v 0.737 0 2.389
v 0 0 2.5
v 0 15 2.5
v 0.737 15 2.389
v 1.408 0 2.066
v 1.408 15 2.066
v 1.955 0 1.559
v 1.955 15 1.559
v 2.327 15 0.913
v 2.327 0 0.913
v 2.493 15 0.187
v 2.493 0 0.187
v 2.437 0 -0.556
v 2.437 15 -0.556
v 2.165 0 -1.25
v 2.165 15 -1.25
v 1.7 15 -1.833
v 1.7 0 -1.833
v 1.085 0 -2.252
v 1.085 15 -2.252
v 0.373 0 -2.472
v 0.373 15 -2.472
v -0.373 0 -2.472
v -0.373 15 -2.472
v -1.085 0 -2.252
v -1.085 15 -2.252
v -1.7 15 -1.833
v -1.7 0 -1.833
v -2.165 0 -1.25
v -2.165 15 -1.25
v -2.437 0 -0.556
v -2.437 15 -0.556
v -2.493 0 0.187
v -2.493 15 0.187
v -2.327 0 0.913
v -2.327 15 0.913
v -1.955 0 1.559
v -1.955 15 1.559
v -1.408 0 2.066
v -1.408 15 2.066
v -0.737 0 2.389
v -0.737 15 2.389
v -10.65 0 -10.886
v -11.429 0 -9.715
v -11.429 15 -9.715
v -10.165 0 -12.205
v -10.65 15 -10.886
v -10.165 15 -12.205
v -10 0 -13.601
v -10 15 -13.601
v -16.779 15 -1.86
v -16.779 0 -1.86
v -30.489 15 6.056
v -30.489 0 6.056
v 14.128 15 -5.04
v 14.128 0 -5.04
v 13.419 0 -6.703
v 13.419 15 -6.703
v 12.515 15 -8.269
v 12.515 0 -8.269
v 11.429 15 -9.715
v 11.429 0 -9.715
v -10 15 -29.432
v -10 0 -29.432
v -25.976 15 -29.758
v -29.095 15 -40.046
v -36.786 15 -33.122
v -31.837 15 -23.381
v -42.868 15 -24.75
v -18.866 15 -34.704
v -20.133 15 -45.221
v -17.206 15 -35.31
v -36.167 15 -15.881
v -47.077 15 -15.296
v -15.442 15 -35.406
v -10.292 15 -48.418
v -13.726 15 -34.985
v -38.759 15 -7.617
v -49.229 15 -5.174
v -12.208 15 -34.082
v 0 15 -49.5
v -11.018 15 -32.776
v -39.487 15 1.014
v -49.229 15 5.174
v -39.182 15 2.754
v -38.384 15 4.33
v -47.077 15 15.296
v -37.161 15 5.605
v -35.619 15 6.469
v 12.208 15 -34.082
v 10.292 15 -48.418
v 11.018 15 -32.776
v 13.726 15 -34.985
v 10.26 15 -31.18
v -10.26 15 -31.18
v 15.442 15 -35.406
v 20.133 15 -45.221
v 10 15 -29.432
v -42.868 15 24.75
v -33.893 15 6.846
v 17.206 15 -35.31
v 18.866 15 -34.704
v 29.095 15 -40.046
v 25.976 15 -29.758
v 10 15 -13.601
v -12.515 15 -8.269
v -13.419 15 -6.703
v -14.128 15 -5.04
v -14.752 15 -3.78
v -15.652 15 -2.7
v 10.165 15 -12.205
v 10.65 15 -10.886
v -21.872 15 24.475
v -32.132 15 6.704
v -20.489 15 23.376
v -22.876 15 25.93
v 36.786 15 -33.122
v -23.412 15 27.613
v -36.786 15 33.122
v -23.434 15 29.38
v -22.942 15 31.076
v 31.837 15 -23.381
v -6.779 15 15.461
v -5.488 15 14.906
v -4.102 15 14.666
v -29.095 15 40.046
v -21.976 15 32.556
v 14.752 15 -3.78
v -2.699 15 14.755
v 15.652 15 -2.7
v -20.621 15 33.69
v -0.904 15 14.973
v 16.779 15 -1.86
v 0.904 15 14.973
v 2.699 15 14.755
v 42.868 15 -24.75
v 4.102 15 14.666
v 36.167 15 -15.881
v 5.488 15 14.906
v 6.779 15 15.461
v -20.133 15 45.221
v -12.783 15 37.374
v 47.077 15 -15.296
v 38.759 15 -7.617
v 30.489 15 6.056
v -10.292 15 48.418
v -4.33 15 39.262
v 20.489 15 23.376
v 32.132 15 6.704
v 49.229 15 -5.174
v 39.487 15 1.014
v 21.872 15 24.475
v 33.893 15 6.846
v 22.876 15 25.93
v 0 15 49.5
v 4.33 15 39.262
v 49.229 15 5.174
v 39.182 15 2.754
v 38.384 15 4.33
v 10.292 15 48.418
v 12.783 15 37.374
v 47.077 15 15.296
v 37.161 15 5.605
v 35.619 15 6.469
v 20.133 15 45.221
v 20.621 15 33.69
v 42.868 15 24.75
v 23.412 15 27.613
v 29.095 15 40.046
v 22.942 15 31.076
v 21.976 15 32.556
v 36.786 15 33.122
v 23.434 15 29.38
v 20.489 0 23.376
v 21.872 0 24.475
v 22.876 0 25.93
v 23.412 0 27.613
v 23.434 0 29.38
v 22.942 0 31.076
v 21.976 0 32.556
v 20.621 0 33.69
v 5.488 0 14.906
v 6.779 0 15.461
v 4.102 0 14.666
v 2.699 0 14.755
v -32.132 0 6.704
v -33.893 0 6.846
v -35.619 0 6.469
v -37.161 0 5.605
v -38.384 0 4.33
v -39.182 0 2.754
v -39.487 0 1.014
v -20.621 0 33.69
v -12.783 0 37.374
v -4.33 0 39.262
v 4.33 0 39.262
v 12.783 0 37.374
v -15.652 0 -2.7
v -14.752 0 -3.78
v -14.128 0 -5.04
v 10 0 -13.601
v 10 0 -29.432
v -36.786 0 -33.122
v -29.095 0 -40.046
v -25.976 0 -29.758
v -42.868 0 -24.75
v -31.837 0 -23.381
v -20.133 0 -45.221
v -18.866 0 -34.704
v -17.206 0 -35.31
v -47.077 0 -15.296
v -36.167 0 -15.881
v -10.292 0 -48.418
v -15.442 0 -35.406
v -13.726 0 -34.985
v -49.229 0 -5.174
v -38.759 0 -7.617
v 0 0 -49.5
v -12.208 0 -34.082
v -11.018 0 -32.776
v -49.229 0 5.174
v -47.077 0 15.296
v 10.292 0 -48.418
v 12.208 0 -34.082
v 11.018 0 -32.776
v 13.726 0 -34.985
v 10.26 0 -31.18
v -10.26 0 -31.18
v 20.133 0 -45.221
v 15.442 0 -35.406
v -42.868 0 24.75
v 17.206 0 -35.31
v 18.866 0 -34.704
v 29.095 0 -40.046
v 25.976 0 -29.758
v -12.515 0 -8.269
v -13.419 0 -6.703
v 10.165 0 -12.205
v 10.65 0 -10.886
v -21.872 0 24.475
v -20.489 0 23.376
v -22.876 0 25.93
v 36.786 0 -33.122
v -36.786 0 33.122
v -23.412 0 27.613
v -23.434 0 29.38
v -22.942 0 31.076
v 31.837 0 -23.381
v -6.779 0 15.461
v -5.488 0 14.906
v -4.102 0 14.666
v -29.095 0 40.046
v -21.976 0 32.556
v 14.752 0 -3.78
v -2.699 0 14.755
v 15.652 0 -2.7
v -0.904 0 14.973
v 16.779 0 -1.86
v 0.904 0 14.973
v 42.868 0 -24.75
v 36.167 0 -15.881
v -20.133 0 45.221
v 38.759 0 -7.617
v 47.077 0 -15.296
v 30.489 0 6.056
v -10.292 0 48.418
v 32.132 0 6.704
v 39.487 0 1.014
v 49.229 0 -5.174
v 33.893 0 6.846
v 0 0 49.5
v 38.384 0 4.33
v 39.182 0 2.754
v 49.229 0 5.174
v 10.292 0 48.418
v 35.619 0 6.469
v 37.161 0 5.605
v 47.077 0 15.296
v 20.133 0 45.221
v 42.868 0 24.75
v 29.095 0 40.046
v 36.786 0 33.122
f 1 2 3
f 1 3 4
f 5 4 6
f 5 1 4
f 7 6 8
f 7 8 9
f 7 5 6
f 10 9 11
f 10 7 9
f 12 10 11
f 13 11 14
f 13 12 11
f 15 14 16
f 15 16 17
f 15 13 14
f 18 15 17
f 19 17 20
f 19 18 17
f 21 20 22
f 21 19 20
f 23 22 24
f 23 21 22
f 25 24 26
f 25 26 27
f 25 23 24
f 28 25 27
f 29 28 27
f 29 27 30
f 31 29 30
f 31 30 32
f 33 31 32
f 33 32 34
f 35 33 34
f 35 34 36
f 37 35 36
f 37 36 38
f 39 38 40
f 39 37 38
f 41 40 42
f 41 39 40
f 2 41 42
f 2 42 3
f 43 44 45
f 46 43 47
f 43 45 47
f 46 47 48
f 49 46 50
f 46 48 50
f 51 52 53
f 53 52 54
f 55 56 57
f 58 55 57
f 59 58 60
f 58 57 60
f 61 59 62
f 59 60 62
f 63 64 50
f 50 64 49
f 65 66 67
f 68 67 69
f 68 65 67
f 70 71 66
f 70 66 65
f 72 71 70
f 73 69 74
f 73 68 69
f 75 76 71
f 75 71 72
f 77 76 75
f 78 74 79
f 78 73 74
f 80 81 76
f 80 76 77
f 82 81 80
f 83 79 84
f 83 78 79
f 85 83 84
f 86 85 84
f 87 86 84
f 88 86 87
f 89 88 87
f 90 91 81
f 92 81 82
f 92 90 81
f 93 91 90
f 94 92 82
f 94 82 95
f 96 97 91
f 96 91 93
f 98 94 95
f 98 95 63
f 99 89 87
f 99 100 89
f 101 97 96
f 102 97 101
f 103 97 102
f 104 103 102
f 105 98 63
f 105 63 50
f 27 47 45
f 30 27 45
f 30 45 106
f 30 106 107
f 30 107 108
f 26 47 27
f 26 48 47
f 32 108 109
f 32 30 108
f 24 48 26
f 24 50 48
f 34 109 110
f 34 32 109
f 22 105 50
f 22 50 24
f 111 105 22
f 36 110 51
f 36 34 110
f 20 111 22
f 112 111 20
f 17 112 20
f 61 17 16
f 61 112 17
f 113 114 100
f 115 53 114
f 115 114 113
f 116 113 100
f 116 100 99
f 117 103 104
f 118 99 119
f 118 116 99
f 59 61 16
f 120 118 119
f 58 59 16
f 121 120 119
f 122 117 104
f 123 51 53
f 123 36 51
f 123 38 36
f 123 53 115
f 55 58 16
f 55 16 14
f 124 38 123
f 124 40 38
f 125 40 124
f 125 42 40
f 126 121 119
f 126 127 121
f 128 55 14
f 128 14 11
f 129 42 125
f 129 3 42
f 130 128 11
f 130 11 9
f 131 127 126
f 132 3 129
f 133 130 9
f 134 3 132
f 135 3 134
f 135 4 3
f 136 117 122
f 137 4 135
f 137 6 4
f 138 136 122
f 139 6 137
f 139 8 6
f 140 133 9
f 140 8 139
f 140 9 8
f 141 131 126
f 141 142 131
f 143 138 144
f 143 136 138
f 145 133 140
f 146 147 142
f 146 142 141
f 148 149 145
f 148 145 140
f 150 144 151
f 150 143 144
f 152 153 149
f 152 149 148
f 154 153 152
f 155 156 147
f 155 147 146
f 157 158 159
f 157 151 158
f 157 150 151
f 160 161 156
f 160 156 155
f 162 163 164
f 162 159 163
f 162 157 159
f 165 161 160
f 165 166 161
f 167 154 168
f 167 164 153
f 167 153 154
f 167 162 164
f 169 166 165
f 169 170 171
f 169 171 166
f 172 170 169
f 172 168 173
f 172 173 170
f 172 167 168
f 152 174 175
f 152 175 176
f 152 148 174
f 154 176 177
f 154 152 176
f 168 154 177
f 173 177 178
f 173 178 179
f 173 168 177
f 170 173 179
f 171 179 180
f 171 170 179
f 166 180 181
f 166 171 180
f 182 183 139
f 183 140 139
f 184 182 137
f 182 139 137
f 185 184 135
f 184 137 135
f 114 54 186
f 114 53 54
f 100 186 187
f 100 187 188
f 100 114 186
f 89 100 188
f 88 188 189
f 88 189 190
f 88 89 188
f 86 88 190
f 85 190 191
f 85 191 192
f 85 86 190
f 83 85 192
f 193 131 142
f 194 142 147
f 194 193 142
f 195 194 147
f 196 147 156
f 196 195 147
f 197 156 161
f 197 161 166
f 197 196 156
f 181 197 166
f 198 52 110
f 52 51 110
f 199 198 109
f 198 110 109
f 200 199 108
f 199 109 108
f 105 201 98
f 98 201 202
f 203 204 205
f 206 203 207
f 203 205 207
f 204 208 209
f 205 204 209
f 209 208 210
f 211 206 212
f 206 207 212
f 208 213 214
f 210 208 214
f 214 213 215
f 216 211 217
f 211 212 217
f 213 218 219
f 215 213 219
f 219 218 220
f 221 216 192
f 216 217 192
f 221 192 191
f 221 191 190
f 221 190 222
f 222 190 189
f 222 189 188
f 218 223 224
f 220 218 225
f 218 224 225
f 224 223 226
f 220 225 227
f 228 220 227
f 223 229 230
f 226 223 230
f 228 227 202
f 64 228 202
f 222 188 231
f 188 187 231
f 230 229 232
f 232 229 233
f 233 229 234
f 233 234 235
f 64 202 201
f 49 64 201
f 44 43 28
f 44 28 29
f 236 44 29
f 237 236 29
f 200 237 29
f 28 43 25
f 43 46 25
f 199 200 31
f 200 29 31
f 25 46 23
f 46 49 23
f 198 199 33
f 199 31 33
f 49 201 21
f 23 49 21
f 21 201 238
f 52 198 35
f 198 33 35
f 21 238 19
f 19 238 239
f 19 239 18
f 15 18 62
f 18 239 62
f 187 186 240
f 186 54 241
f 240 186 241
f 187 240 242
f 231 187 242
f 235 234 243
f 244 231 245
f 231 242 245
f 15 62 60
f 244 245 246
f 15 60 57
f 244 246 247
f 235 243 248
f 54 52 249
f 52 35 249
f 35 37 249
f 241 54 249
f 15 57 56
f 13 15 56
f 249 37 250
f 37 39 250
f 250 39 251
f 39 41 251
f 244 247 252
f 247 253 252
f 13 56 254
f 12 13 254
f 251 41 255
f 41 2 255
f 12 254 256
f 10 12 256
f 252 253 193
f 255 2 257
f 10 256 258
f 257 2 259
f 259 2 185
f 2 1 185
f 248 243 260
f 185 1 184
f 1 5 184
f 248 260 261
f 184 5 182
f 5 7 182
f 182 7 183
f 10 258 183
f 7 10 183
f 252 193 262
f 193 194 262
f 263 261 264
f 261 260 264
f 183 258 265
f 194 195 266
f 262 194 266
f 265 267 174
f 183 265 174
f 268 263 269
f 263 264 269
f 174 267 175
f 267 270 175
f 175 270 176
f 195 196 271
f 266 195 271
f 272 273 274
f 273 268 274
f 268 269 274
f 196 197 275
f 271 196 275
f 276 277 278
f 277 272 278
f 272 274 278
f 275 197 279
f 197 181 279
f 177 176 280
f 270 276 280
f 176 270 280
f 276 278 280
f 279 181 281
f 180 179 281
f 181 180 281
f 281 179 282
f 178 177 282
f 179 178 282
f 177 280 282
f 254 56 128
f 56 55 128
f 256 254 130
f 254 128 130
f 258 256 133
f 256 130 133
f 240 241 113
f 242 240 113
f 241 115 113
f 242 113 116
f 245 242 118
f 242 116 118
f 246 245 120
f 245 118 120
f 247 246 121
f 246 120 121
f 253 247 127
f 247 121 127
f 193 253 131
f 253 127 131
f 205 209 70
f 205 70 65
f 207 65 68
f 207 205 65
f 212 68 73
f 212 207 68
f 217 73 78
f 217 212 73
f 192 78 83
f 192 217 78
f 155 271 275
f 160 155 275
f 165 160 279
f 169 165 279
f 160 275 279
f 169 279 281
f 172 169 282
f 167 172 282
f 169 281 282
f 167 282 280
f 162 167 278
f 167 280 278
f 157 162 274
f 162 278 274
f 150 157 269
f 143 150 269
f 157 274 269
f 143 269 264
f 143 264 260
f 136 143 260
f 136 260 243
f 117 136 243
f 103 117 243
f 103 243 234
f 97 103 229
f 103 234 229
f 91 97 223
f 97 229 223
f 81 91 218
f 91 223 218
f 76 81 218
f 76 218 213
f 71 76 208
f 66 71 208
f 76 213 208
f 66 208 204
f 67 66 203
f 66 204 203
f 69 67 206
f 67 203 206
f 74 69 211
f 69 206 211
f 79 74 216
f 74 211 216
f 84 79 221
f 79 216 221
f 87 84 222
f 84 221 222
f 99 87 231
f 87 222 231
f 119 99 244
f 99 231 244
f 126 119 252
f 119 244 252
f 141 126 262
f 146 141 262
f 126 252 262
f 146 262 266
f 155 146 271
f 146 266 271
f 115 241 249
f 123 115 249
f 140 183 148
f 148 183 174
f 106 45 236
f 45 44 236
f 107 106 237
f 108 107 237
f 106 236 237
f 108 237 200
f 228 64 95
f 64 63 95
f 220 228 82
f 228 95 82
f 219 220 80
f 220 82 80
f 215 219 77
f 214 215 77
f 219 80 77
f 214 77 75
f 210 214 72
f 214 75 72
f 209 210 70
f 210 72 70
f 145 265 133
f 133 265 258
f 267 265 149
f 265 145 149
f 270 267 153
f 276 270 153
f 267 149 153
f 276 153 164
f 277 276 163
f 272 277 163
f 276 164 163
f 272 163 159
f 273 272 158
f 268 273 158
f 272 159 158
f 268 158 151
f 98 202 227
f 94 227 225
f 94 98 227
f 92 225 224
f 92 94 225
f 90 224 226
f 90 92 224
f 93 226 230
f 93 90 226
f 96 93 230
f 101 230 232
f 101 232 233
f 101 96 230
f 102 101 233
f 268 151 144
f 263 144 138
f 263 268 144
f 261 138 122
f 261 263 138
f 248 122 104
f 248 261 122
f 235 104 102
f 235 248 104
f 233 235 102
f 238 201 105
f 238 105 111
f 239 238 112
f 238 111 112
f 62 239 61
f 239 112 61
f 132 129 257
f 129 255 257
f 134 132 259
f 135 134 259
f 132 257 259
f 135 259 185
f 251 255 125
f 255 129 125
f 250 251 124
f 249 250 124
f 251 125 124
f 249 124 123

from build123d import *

# Parameters (mm, degrees)
SZKIC1_R                    = 49.5
SZKIC1_R_2                  = 39.5
SZKIC1_R_3                  = 15
SZKIC1_R_4                  = 2.5
DODANIE_WYCI_GNI_CIE1_DEPTH = 15
ZAOKR_GLENIE1_R             = 6


with BuildPart() as part:
    # Szkic1 → Dodanie-wyciągnięcie1 (new body)
    # profile 1 of 6: a face of its own
    with BuildSketch(Plane(origin=(0, 0, 0), x_dir=(1, 0, 0), z_dir=(0, 1, 0))):
        with Locations(Location((0, 0, 0), (0, 0, 270))):
            Circle(SZKIC1_R)
        Circle(SZKIC1_R_2, mode=Mode.SUBTRACT)
    # profile 2 of 6: a face of its own
    with BuildSketch(Plane(origin=(0, 0, 0), x_dir=(1, 0, 0), z_dir=(0, 1, 0))):
        with BuildLine():
            ThreePointArc((-10, 11.180339887), (-5.352331347, 14.012585384), (0, 15))
            Line((0, 15), (0, 39.5))
            ThreePointArc((0, 39.5), (-5.041225271, 39.176983648), (-10, 38.213217609))
            Line((-10, 38.213217609), (-10, 11.180339887))
        make_face()
    # profile 3 of 6: a face of its own
    with BuildSketch(Plane(origin=(0, 0, 0), x_dir=(1, 0, 0), z_dir=(0, 1, 0))):
        with BuildLine():
            Line((0, 39.5), (0, 15))
            ThreePointArc((0, 15), (5.352331347, 14.012585384), (10, 11.180339887))
            Line((10, 11.180339887), (10, 38.213217609))
            ThreePointArc((10, 38.213217609), (5.041225271, 39.176983648), (0, 39.5))
        make_face()
    # profile 4 of 6: a face of its own
    with BuildSketch(Plane(origin=(0, 0, 0), x_dir=(1, 0, 0), z_dir=(0, 1, 0))):
        with BuildLine():
            Line((38.093617209, -10.446354766), (14.682458366, 3.070084094))
            ThreePointArc((14.682458366, 3.070084094), (14.920403404, 1.54323111), (15, 0))
            ThreePointArc((15, 0), (12.149832828, -8.796679047), (4.682458366, -14.250423982))
            Line((4.682458366, -14.250423982), (28.093617209, -27.766862842))
            ThreePointArc((28.093617209, -27.766862842), (34.208003449, -19.75), (38.093617209, -10.446354766))
        make_face()
    # profile 5 of 6: a face of its own
    with BuildSketch(Plane(origin=(0, 0, 0), x_dir=(1, 0, 0), z_dir=(0, 1, 0))):
        Circle(SZKIC1_R_3)
        with Locations(Location((0, 0, 0), (0, 0, 270))):
            Circle(SZKIC1_R_4, mode=Mode.SUBTRACT)
    # profile 6 of 6: a face of its own
    with BuildSketch(Plane(origin=(0, 0, 0), x_dir=(1, 0, 0), z_dir=(0, 1, 0))):
        with BuildLine():
            ThreePointArc((-4.682458366, -14.250423982), (-12.990381057, -7.5), (-14.682458366, 3.070084094))
            Line((-14.682458366, 3.070084094), (-38.093617209, -10.446354766))
            ThreePointArc((-38.093617209, -10.446354766), (-34.208003449, -19.75), (-28.093617209, -27.766862842))
            Line((-28.093617209, -27.766862842), (-4.682458366, -14.250423982))
        make_face()
    extrude(amount=DODANIE_WYCI_GNI_CIE1_DEPTH)

    # Zaokrąglenie1
    zaokr_glenie1_edges = [part.edges().sort_by_distance(p)[0] for p in [
        (14.682458366, 7.5, -3.070084094),
        (38.093617209, 7.5, 10.446354766),
        (10, 7.5, -38.213217609),
        (10, 7.5, -11.180339887),
        (-10, 7.5, -38.213217609),
        (-38.093617209, 7.5, 10.446354766),
        (-14.682458366, 7.5, -3.070084094),
        (-10, 7.5, -11.180339887),
        (-28.093617209, 7.5, 27.766862842),
        (28.093617209, 7.5, 27.766862842),
        (4.682458366, 7.5, 14.250423982),
        (-4.682458366, 7.5, 14.250423982),
    ]]
    fillet(zaokr_glenie1_edges, radius=ZAOKR_GLENIE1_R)


solid = part.part
